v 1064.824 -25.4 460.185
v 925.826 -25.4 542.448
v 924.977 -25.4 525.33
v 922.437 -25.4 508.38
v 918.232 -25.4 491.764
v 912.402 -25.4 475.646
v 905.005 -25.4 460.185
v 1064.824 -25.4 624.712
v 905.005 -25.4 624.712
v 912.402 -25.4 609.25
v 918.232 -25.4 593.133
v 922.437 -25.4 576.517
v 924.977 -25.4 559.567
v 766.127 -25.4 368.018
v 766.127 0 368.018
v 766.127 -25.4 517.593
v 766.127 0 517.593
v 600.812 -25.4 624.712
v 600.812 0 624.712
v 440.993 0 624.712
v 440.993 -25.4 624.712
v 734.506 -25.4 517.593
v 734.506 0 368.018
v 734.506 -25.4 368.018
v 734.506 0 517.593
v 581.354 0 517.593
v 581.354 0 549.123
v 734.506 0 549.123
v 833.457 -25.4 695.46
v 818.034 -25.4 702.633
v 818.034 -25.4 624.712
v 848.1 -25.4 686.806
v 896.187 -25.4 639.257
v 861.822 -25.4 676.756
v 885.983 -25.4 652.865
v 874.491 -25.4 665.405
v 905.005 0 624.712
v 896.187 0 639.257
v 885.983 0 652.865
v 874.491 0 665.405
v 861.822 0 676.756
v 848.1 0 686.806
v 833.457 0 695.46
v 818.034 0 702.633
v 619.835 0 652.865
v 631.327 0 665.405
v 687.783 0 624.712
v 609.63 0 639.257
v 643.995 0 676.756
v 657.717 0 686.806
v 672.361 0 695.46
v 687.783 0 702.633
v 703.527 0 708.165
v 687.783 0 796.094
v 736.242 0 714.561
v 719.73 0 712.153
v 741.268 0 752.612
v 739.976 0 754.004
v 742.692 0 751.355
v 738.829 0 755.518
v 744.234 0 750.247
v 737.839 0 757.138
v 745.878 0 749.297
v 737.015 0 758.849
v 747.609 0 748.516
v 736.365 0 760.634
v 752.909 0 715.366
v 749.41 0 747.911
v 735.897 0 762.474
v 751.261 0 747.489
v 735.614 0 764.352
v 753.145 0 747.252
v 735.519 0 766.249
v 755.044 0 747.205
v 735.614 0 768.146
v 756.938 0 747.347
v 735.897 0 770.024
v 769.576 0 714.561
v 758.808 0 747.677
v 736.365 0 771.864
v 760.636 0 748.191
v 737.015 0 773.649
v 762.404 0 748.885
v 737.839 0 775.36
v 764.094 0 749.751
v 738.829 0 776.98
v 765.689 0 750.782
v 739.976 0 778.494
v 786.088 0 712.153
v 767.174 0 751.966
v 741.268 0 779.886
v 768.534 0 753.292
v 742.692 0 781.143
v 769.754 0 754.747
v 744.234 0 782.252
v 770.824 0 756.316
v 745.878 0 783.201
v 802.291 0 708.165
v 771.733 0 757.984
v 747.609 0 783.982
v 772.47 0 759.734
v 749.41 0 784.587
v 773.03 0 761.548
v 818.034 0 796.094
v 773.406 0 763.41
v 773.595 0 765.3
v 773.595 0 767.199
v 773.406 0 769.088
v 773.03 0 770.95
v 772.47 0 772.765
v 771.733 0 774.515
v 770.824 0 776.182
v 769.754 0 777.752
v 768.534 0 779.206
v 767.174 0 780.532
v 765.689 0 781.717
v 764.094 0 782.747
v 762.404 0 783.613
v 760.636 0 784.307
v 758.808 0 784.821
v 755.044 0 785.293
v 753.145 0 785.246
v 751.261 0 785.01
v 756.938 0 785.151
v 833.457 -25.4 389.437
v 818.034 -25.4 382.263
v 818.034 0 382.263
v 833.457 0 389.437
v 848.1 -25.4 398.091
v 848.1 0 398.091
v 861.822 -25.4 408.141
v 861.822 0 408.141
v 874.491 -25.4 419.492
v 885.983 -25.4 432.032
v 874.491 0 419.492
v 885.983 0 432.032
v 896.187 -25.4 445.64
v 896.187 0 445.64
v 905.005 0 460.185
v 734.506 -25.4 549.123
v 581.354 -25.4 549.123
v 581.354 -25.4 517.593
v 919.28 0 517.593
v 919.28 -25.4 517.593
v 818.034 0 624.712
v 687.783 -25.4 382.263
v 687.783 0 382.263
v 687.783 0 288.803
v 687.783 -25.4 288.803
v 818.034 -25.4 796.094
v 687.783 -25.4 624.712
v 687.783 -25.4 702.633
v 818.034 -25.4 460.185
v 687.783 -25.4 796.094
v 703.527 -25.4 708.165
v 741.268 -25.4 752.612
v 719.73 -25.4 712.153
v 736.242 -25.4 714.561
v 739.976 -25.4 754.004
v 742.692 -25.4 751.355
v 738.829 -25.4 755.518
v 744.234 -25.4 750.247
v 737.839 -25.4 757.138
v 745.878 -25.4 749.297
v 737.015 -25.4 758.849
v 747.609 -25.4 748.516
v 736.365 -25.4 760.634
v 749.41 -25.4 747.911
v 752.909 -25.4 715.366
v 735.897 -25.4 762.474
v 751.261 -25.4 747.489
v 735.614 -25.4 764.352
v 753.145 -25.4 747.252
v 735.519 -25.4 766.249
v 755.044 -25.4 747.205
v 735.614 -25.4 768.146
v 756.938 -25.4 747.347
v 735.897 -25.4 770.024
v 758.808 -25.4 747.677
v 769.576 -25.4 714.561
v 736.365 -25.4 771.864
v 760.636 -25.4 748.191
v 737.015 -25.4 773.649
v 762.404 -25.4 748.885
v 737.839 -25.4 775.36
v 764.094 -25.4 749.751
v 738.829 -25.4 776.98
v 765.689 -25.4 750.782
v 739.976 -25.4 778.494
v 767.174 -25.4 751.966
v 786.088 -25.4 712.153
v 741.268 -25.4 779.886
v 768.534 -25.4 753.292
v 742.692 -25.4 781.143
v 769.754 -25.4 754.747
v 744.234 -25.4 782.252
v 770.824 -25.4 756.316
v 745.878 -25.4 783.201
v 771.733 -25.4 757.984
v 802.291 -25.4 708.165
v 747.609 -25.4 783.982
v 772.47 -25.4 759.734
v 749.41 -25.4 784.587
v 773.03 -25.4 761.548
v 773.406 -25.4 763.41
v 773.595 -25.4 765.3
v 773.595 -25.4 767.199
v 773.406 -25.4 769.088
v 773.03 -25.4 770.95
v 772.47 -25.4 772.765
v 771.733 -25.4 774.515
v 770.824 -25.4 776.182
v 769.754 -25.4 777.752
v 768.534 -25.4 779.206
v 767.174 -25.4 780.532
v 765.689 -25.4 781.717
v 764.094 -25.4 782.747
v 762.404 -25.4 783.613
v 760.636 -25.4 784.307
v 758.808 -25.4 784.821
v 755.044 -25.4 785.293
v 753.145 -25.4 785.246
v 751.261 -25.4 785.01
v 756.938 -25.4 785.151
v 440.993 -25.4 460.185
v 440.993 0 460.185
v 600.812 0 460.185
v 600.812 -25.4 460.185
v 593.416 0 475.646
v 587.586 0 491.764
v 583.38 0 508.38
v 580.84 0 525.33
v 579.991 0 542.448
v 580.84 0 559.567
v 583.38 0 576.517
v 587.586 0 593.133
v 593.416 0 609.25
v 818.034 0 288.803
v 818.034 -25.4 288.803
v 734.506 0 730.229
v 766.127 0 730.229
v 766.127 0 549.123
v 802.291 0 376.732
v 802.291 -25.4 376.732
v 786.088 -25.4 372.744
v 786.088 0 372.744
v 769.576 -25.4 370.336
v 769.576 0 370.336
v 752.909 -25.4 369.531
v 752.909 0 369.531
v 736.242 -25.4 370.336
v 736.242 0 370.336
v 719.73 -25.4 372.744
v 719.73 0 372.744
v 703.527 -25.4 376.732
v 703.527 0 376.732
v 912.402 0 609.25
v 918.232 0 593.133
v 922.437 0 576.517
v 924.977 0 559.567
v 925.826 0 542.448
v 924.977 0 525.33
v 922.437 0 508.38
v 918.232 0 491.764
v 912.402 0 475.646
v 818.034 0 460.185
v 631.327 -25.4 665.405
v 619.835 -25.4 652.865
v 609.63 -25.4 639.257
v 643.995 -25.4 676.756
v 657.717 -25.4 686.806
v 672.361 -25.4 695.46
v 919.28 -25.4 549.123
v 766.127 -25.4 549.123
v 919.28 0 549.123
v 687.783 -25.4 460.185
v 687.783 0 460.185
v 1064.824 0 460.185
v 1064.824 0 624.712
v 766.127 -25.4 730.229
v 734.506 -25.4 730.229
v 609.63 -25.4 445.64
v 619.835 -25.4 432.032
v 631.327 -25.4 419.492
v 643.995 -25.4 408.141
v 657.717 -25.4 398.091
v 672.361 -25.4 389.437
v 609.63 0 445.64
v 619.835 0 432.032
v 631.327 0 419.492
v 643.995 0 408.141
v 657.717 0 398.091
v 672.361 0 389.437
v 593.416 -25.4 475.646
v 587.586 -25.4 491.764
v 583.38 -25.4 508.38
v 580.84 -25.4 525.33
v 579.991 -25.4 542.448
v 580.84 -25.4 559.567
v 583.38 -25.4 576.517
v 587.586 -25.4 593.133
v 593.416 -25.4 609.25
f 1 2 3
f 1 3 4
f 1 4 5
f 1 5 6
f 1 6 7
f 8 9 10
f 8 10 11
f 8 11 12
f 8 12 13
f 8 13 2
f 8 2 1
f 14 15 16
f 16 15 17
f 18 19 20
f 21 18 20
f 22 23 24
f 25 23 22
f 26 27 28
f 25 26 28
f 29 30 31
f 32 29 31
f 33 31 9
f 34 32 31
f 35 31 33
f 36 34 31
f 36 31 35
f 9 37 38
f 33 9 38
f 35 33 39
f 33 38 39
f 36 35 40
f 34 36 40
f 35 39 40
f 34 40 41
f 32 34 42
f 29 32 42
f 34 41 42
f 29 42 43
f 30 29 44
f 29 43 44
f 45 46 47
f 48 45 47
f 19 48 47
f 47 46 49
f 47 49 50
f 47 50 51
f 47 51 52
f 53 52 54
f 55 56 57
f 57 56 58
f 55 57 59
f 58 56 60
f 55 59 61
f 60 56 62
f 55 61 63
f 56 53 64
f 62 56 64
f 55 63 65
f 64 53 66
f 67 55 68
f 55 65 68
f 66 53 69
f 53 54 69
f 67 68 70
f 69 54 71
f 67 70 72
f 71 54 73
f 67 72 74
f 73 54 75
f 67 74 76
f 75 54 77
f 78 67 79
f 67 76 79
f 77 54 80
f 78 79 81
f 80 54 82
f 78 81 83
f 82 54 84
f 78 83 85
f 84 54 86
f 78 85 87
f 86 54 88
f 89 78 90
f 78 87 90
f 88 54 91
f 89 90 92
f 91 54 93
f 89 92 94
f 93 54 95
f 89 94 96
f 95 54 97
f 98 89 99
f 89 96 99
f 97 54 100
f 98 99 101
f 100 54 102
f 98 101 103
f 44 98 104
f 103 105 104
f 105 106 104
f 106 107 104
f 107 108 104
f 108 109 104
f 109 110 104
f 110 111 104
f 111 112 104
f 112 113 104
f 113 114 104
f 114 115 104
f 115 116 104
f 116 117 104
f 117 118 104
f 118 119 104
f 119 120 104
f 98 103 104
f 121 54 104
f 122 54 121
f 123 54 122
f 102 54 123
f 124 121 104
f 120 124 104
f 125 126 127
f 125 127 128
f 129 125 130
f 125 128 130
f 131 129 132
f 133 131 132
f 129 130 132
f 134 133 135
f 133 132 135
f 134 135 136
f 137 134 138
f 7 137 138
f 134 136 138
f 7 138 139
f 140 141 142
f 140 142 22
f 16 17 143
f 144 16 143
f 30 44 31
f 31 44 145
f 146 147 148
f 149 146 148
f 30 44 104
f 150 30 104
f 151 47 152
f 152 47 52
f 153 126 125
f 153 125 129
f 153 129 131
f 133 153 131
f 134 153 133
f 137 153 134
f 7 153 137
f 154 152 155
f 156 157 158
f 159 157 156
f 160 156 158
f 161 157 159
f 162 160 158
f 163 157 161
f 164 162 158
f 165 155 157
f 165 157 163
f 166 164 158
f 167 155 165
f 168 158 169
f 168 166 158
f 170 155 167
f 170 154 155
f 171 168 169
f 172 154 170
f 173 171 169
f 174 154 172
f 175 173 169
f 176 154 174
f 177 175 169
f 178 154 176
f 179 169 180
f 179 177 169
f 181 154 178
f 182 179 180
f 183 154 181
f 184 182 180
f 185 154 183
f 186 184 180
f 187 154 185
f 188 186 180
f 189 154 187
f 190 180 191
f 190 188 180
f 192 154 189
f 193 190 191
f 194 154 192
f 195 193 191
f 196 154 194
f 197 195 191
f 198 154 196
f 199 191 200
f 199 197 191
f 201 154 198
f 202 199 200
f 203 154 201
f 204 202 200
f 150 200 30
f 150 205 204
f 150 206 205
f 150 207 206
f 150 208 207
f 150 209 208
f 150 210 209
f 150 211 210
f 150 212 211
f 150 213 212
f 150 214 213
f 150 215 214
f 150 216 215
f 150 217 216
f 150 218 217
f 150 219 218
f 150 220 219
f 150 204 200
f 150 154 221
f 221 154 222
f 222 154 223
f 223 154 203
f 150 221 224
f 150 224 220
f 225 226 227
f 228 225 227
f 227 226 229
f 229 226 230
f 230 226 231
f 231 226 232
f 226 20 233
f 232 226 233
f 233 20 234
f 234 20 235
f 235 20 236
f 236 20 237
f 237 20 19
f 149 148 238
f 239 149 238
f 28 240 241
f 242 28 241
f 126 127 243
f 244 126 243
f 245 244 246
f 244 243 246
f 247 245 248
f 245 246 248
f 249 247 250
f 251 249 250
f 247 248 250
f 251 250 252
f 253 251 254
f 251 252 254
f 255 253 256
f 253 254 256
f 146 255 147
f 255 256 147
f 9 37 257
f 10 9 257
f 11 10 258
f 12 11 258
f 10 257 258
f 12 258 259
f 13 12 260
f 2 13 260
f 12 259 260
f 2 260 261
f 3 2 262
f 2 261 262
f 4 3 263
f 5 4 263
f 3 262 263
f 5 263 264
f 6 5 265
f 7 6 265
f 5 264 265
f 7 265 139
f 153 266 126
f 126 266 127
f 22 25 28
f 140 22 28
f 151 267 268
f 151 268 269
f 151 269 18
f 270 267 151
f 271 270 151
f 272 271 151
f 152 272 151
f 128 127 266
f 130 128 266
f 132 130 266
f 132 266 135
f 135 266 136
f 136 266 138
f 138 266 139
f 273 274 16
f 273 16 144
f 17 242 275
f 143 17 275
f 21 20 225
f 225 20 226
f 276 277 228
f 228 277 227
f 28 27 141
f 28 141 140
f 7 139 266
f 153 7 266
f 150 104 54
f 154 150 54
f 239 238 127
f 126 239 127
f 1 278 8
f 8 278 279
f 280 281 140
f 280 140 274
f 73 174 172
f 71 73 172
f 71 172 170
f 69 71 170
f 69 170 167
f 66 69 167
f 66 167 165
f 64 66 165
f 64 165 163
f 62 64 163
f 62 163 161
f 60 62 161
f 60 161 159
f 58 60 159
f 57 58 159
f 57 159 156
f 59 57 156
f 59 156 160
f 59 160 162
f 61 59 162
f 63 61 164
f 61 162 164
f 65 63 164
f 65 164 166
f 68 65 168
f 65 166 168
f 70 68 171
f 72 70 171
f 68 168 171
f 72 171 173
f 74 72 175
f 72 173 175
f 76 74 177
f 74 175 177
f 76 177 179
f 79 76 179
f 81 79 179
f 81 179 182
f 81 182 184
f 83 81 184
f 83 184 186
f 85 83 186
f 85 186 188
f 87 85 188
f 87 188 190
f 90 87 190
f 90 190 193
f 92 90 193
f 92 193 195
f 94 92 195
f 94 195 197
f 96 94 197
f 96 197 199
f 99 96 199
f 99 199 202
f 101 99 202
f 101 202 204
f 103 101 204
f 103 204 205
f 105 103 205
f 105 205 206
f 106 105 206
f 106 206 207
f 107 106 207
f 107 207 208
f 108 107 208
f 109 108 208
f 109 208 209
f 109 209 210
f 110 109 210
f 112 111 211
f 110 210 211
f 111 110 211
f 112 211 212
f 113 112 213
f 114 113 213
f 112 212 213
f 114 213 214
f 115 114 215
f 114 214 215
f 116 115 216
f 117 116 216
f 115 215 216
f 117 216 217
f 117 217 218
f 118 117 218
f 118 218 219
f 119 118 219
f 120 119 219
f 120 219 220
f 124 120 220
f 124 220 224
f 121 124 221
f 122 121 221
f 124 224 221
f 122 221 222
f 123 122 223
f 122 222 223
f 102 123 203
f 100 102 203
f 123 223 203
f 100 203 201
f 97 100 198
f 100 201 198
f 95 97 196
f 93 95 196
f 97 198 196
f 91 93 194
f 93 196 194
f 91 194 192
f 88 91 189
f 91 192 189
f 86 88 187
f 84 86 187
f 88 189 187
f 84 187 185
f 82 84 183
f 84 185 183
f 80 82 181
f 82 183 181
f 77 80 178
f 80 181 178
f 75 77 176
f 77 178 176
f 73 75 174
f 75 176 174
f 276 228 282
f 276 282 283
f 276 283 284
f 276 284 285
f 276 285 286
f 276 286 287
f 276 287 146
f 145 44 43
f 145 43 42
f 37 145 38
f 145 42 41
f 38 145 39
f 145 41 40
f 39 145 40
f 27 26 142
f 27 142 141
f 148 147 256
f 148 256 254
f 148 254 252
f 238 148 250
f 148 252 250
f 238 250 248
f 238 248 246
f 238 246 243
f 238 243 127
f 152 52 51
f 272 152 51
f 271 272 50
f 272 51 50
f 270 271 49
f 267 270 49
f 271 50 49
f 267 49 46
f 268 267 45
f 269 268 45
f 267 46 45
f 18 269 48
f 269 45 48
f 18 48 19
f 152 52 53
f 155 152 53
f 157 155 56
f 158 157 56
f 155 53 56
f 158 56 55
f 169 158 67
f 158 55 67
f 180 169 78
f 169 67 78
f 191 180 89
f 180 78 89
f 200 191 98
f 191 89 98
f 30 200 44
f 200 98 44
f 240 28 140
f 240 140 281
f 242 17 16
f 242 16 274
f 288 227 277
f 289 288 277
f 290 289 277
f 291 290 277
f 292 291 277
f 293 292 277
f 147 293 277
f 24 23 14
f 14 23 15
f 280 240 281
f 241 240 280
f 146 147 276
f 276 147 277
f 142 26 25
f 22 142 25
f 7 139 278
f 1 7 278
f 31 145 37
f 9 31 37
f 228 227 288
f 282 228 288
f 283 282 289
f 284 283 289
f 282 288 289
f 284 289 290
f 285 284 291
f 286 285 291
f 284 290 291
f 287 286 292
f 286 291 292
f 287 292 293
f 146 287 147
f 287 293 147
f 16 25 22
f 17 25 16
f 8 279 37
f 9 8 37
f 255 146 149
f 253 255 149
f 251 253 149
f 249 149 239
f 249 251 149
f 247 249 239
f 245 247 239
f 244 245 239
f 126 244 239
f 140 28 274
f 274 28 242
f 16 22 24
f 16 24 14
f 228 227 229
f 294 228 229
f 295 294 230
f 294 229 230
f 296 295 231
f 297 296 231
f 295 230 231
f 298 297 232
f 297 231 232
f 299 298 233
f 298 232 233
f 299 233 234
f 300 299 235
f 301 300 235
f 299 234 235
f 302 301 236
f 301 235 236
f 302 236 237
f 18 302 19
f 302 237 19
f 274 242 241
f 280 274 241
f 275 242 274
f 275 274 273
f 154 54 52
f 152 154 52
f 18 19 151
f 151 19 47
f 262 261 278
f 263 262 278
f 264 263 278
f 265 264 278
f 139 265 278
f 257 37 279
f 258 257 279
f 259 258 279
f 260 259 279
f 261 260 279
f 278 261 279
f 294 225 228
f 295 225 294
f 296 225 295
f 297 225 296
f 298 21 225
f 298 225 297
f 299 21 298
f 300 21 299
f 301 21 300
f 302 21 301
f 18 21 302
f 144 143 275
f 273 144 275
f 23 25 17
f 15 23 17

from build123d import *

# Parameters (mm, degrees)
F1_DEPTH = 25.4
F2_W     = 31.6208600998
F2_H     = 149.5748460293
F3_DEPTH = 25.4
F2_H_2   = 181.1054646969
F2_W_2   = 153.152346611
F2_H_3   = 31.5306186676
F5_D     = 38.1


with BuildPart() as f1:
    # F0 (on Front) → F1 (new body)
    with BuildSketch(Plane.XZ):
        with BuildLine():
            Line((818.0339336395, 288.8030409813), (818.0339336395, 382.2634366477))
            ThreePointArc((818.0339336395, 382.2634366477), (752.908706665, 369.5307429552), (687.7834796906, 382.2634366477))
            Line((687.7834796906, 382.2634366477), (687.7834796906, 288.8030409813))
            Line((687.7834796906, 288.8030409813), (818.0339336395, 288.8030409813))
        make_face()
    extrude(amount=F1_DEPTH)


with BuildPart() as f1b:
    # F0 (on Front) → F1, piece 2 (new body)
    with BuildSketch(Plane.XZ):
        with BuildLine():
            ThreePointArc((600.8124266323, 460.185110569), (579.9909885645, 542.4484610558), (600.8124266323, 624.7118115425))
            Line((600.8124266323, 624.7118115425), (440.9933388233, 624.7118115425))
            Line((440.9933388233, 624.7118115425), (440.9933388233, 460.185110569))
            Line((440.9933388233, 460.185110569), (600.8124266323, 460.185110569))
        make_face()
    extrude(amount=F1_DEPTH)


with BuildPart() as f1c:
    # F0 (on Front) → F1, piece 3 (new body)
    with BuildSketch(Plane.XZ):
        with BuildLine():
            ThreePointArc((600.8124266323, 460.185110569), (637.5213477678, 413.6606718838), (687.7834796906, 382.2634366477))
            Line((687.7834796906, 382.2634366477), (687.7834796906, 460.185110569))
            Line((687.7834796906, 460.185110569), (600.8124266323, 460.185110569))
        make_face()
    extrude(amount=F1_DEPTH)


with BuildPart() as f1d:
    # F0 (on Front) → F1, piece 4 (new body)
    with BuildSketch(Plane.XZ):
        with BuildLine():
            ThreePointArc((905.0049866977, 624.7118115425), (920.5402653107, 584.8771987123), (925.8264247656, 542.4484610558))
            ThreePointArc((925.8264247656, 542.4484610558), (920.5402653107, 500.0197233992), (905.0049866977, 460.185110569))
            Line((905.0049866977, 460.185110569), (1064.8240745068, 460.185110569))
            Line((1064.8240745068, 460.185110569), (1064.8240745068, 624.7118115425))
            Line((1064.8240745068, 624.7118115425), (905.0049866977, 624.7118115425))
        make_face()
    extrude(amount=F1_DEPTH)


with BuildPart() as f1e:
    # F0 (on Front) → F1, piece 5 (new body)
    with BuildSketch(Plane.XZ):
        with BuildLine():
            ThreePointArc((818.0339336395, 382.2634366477), (868.2960655623, 413.6606718838), (905.0049866977, 460.185110569))
            Line((905.0049866977, 460.185110569), (818.0339336395, 460.185110569))
            Line((818.0339336395, 460.185110569), (818.0339336395, 382.2634366477))
        make_face()
    extrude(amount=F1_DEPTH)


with BuildPart() as f1f:
    # F0 (on Front) → F1, piece 6 (new body)
    with BuildSketch(Plane.XZ):
        with BuildLine():
            Line((687.7834796906, 624.7118115425), (687.7834796906, 702.6334854638))
            ThreePointArc((687.7834796906, 702.6334854638), (637.5213477678, 671.2362502277), (600.8124266323, 624.7118115425))
            Line((600.8124266323, 624.7118115425), (687.7834796906, 624.7118115425))
        make_face()
    extrude(amount=F1_DEPTH)


with BuildPart() as f1g:
    # F0 (on Front) → F1, piece 7 (new body)
    with BuildSketch(Plane.XZ):
        with BuildLine():
            ThreePointArc((687.7834796906, 702.6334854638), (752.908706665, 715.3661791563), (818.0339336395, 702.6334854638))
            Line((818.0339336395, 702.6334854638), (818.0339336395, 796.0938811302))
            Line((818.0339336395, 796.0938811302), (687.7834796906, 796.0938811302))
            Line((687.7834796906, 796.0938811302), (687.7834796906, 702.6334854638))
        make_face()
    extrude(amount=F1_DEPTH)

    # F5 (through all)
    with Locations(Plane(origin=(0, 0, 0), x_dir=(1, 0, 0), z_dir=(0, 1, 0))):
        with Locations((754.5690536499, -766.2491202354)):
            Hole(F5_D / 2)


with BuildPart() as f1h:
    # F0 (on Front) → F1, piece 8 (new body)
    with BuildSketch(Plane.XZ):
        with BuildLine():
            Line((818.0339336395, 624.7118115425), (905.0049866977, 624.7118115425))
            ThreePointArc((905.0049866977, 624.7118115425), (868.2960655623, 671.2362502277), (818.0339336395, 702.6334854638))
            Line((818.0339336395, 702.6334854638), (818.0339336395, 624.7118115425))
        make_face()
    extrude(amount=F1_DEPTH)


with BuildPart() as f3:
    # F2 (on Front) → F3 (new body)
    with BuildSketch(Plane.XZ):
        with Locations((750.3167390823, 442.8054243326)):
            Rectangle(F2_W, F2_H)
    extrude(amount=F3_DEPTH)


with BuildPart() as f3b:
    # F2 (on Front) → F3, piece 2 (new body)
    with BuildSketch(Plane.XZ):
        with Locations((750.3167390823, 639.6761983633)):
            Rectangle(F2_W, F2_H_2)
    extrude(amount=F3_DEPTH)


with BuildPart() as f3c:
    # F2 (on Front) → F3, piece 3 (new body)
    with BuildSketch(Plane.XZ):
        with Locations((842.7033424377, 533.3581566811)):
            Rectangle(F2_W_2, F2_H_3)
    extrude(amount=F3_DEPTH)


with BuildPart() as f3d:
    # F2 (on Front) → F3, piece 4 (new body)
    with BuildSketch(Plane.XZ):
        with Locations((657.9301357269, 533.3581566811)):
            Rectangle(F2_W_2, F2_H_3)
    extrude(amount=F3_DEPTH)


solid = Compound([f1.part, f1b.part, f1c.part, f1d.part, f1e.part, f1f.part, f1g.part, f1h.part, f3.part, f3b.part, f3c.part, f3d.part])
